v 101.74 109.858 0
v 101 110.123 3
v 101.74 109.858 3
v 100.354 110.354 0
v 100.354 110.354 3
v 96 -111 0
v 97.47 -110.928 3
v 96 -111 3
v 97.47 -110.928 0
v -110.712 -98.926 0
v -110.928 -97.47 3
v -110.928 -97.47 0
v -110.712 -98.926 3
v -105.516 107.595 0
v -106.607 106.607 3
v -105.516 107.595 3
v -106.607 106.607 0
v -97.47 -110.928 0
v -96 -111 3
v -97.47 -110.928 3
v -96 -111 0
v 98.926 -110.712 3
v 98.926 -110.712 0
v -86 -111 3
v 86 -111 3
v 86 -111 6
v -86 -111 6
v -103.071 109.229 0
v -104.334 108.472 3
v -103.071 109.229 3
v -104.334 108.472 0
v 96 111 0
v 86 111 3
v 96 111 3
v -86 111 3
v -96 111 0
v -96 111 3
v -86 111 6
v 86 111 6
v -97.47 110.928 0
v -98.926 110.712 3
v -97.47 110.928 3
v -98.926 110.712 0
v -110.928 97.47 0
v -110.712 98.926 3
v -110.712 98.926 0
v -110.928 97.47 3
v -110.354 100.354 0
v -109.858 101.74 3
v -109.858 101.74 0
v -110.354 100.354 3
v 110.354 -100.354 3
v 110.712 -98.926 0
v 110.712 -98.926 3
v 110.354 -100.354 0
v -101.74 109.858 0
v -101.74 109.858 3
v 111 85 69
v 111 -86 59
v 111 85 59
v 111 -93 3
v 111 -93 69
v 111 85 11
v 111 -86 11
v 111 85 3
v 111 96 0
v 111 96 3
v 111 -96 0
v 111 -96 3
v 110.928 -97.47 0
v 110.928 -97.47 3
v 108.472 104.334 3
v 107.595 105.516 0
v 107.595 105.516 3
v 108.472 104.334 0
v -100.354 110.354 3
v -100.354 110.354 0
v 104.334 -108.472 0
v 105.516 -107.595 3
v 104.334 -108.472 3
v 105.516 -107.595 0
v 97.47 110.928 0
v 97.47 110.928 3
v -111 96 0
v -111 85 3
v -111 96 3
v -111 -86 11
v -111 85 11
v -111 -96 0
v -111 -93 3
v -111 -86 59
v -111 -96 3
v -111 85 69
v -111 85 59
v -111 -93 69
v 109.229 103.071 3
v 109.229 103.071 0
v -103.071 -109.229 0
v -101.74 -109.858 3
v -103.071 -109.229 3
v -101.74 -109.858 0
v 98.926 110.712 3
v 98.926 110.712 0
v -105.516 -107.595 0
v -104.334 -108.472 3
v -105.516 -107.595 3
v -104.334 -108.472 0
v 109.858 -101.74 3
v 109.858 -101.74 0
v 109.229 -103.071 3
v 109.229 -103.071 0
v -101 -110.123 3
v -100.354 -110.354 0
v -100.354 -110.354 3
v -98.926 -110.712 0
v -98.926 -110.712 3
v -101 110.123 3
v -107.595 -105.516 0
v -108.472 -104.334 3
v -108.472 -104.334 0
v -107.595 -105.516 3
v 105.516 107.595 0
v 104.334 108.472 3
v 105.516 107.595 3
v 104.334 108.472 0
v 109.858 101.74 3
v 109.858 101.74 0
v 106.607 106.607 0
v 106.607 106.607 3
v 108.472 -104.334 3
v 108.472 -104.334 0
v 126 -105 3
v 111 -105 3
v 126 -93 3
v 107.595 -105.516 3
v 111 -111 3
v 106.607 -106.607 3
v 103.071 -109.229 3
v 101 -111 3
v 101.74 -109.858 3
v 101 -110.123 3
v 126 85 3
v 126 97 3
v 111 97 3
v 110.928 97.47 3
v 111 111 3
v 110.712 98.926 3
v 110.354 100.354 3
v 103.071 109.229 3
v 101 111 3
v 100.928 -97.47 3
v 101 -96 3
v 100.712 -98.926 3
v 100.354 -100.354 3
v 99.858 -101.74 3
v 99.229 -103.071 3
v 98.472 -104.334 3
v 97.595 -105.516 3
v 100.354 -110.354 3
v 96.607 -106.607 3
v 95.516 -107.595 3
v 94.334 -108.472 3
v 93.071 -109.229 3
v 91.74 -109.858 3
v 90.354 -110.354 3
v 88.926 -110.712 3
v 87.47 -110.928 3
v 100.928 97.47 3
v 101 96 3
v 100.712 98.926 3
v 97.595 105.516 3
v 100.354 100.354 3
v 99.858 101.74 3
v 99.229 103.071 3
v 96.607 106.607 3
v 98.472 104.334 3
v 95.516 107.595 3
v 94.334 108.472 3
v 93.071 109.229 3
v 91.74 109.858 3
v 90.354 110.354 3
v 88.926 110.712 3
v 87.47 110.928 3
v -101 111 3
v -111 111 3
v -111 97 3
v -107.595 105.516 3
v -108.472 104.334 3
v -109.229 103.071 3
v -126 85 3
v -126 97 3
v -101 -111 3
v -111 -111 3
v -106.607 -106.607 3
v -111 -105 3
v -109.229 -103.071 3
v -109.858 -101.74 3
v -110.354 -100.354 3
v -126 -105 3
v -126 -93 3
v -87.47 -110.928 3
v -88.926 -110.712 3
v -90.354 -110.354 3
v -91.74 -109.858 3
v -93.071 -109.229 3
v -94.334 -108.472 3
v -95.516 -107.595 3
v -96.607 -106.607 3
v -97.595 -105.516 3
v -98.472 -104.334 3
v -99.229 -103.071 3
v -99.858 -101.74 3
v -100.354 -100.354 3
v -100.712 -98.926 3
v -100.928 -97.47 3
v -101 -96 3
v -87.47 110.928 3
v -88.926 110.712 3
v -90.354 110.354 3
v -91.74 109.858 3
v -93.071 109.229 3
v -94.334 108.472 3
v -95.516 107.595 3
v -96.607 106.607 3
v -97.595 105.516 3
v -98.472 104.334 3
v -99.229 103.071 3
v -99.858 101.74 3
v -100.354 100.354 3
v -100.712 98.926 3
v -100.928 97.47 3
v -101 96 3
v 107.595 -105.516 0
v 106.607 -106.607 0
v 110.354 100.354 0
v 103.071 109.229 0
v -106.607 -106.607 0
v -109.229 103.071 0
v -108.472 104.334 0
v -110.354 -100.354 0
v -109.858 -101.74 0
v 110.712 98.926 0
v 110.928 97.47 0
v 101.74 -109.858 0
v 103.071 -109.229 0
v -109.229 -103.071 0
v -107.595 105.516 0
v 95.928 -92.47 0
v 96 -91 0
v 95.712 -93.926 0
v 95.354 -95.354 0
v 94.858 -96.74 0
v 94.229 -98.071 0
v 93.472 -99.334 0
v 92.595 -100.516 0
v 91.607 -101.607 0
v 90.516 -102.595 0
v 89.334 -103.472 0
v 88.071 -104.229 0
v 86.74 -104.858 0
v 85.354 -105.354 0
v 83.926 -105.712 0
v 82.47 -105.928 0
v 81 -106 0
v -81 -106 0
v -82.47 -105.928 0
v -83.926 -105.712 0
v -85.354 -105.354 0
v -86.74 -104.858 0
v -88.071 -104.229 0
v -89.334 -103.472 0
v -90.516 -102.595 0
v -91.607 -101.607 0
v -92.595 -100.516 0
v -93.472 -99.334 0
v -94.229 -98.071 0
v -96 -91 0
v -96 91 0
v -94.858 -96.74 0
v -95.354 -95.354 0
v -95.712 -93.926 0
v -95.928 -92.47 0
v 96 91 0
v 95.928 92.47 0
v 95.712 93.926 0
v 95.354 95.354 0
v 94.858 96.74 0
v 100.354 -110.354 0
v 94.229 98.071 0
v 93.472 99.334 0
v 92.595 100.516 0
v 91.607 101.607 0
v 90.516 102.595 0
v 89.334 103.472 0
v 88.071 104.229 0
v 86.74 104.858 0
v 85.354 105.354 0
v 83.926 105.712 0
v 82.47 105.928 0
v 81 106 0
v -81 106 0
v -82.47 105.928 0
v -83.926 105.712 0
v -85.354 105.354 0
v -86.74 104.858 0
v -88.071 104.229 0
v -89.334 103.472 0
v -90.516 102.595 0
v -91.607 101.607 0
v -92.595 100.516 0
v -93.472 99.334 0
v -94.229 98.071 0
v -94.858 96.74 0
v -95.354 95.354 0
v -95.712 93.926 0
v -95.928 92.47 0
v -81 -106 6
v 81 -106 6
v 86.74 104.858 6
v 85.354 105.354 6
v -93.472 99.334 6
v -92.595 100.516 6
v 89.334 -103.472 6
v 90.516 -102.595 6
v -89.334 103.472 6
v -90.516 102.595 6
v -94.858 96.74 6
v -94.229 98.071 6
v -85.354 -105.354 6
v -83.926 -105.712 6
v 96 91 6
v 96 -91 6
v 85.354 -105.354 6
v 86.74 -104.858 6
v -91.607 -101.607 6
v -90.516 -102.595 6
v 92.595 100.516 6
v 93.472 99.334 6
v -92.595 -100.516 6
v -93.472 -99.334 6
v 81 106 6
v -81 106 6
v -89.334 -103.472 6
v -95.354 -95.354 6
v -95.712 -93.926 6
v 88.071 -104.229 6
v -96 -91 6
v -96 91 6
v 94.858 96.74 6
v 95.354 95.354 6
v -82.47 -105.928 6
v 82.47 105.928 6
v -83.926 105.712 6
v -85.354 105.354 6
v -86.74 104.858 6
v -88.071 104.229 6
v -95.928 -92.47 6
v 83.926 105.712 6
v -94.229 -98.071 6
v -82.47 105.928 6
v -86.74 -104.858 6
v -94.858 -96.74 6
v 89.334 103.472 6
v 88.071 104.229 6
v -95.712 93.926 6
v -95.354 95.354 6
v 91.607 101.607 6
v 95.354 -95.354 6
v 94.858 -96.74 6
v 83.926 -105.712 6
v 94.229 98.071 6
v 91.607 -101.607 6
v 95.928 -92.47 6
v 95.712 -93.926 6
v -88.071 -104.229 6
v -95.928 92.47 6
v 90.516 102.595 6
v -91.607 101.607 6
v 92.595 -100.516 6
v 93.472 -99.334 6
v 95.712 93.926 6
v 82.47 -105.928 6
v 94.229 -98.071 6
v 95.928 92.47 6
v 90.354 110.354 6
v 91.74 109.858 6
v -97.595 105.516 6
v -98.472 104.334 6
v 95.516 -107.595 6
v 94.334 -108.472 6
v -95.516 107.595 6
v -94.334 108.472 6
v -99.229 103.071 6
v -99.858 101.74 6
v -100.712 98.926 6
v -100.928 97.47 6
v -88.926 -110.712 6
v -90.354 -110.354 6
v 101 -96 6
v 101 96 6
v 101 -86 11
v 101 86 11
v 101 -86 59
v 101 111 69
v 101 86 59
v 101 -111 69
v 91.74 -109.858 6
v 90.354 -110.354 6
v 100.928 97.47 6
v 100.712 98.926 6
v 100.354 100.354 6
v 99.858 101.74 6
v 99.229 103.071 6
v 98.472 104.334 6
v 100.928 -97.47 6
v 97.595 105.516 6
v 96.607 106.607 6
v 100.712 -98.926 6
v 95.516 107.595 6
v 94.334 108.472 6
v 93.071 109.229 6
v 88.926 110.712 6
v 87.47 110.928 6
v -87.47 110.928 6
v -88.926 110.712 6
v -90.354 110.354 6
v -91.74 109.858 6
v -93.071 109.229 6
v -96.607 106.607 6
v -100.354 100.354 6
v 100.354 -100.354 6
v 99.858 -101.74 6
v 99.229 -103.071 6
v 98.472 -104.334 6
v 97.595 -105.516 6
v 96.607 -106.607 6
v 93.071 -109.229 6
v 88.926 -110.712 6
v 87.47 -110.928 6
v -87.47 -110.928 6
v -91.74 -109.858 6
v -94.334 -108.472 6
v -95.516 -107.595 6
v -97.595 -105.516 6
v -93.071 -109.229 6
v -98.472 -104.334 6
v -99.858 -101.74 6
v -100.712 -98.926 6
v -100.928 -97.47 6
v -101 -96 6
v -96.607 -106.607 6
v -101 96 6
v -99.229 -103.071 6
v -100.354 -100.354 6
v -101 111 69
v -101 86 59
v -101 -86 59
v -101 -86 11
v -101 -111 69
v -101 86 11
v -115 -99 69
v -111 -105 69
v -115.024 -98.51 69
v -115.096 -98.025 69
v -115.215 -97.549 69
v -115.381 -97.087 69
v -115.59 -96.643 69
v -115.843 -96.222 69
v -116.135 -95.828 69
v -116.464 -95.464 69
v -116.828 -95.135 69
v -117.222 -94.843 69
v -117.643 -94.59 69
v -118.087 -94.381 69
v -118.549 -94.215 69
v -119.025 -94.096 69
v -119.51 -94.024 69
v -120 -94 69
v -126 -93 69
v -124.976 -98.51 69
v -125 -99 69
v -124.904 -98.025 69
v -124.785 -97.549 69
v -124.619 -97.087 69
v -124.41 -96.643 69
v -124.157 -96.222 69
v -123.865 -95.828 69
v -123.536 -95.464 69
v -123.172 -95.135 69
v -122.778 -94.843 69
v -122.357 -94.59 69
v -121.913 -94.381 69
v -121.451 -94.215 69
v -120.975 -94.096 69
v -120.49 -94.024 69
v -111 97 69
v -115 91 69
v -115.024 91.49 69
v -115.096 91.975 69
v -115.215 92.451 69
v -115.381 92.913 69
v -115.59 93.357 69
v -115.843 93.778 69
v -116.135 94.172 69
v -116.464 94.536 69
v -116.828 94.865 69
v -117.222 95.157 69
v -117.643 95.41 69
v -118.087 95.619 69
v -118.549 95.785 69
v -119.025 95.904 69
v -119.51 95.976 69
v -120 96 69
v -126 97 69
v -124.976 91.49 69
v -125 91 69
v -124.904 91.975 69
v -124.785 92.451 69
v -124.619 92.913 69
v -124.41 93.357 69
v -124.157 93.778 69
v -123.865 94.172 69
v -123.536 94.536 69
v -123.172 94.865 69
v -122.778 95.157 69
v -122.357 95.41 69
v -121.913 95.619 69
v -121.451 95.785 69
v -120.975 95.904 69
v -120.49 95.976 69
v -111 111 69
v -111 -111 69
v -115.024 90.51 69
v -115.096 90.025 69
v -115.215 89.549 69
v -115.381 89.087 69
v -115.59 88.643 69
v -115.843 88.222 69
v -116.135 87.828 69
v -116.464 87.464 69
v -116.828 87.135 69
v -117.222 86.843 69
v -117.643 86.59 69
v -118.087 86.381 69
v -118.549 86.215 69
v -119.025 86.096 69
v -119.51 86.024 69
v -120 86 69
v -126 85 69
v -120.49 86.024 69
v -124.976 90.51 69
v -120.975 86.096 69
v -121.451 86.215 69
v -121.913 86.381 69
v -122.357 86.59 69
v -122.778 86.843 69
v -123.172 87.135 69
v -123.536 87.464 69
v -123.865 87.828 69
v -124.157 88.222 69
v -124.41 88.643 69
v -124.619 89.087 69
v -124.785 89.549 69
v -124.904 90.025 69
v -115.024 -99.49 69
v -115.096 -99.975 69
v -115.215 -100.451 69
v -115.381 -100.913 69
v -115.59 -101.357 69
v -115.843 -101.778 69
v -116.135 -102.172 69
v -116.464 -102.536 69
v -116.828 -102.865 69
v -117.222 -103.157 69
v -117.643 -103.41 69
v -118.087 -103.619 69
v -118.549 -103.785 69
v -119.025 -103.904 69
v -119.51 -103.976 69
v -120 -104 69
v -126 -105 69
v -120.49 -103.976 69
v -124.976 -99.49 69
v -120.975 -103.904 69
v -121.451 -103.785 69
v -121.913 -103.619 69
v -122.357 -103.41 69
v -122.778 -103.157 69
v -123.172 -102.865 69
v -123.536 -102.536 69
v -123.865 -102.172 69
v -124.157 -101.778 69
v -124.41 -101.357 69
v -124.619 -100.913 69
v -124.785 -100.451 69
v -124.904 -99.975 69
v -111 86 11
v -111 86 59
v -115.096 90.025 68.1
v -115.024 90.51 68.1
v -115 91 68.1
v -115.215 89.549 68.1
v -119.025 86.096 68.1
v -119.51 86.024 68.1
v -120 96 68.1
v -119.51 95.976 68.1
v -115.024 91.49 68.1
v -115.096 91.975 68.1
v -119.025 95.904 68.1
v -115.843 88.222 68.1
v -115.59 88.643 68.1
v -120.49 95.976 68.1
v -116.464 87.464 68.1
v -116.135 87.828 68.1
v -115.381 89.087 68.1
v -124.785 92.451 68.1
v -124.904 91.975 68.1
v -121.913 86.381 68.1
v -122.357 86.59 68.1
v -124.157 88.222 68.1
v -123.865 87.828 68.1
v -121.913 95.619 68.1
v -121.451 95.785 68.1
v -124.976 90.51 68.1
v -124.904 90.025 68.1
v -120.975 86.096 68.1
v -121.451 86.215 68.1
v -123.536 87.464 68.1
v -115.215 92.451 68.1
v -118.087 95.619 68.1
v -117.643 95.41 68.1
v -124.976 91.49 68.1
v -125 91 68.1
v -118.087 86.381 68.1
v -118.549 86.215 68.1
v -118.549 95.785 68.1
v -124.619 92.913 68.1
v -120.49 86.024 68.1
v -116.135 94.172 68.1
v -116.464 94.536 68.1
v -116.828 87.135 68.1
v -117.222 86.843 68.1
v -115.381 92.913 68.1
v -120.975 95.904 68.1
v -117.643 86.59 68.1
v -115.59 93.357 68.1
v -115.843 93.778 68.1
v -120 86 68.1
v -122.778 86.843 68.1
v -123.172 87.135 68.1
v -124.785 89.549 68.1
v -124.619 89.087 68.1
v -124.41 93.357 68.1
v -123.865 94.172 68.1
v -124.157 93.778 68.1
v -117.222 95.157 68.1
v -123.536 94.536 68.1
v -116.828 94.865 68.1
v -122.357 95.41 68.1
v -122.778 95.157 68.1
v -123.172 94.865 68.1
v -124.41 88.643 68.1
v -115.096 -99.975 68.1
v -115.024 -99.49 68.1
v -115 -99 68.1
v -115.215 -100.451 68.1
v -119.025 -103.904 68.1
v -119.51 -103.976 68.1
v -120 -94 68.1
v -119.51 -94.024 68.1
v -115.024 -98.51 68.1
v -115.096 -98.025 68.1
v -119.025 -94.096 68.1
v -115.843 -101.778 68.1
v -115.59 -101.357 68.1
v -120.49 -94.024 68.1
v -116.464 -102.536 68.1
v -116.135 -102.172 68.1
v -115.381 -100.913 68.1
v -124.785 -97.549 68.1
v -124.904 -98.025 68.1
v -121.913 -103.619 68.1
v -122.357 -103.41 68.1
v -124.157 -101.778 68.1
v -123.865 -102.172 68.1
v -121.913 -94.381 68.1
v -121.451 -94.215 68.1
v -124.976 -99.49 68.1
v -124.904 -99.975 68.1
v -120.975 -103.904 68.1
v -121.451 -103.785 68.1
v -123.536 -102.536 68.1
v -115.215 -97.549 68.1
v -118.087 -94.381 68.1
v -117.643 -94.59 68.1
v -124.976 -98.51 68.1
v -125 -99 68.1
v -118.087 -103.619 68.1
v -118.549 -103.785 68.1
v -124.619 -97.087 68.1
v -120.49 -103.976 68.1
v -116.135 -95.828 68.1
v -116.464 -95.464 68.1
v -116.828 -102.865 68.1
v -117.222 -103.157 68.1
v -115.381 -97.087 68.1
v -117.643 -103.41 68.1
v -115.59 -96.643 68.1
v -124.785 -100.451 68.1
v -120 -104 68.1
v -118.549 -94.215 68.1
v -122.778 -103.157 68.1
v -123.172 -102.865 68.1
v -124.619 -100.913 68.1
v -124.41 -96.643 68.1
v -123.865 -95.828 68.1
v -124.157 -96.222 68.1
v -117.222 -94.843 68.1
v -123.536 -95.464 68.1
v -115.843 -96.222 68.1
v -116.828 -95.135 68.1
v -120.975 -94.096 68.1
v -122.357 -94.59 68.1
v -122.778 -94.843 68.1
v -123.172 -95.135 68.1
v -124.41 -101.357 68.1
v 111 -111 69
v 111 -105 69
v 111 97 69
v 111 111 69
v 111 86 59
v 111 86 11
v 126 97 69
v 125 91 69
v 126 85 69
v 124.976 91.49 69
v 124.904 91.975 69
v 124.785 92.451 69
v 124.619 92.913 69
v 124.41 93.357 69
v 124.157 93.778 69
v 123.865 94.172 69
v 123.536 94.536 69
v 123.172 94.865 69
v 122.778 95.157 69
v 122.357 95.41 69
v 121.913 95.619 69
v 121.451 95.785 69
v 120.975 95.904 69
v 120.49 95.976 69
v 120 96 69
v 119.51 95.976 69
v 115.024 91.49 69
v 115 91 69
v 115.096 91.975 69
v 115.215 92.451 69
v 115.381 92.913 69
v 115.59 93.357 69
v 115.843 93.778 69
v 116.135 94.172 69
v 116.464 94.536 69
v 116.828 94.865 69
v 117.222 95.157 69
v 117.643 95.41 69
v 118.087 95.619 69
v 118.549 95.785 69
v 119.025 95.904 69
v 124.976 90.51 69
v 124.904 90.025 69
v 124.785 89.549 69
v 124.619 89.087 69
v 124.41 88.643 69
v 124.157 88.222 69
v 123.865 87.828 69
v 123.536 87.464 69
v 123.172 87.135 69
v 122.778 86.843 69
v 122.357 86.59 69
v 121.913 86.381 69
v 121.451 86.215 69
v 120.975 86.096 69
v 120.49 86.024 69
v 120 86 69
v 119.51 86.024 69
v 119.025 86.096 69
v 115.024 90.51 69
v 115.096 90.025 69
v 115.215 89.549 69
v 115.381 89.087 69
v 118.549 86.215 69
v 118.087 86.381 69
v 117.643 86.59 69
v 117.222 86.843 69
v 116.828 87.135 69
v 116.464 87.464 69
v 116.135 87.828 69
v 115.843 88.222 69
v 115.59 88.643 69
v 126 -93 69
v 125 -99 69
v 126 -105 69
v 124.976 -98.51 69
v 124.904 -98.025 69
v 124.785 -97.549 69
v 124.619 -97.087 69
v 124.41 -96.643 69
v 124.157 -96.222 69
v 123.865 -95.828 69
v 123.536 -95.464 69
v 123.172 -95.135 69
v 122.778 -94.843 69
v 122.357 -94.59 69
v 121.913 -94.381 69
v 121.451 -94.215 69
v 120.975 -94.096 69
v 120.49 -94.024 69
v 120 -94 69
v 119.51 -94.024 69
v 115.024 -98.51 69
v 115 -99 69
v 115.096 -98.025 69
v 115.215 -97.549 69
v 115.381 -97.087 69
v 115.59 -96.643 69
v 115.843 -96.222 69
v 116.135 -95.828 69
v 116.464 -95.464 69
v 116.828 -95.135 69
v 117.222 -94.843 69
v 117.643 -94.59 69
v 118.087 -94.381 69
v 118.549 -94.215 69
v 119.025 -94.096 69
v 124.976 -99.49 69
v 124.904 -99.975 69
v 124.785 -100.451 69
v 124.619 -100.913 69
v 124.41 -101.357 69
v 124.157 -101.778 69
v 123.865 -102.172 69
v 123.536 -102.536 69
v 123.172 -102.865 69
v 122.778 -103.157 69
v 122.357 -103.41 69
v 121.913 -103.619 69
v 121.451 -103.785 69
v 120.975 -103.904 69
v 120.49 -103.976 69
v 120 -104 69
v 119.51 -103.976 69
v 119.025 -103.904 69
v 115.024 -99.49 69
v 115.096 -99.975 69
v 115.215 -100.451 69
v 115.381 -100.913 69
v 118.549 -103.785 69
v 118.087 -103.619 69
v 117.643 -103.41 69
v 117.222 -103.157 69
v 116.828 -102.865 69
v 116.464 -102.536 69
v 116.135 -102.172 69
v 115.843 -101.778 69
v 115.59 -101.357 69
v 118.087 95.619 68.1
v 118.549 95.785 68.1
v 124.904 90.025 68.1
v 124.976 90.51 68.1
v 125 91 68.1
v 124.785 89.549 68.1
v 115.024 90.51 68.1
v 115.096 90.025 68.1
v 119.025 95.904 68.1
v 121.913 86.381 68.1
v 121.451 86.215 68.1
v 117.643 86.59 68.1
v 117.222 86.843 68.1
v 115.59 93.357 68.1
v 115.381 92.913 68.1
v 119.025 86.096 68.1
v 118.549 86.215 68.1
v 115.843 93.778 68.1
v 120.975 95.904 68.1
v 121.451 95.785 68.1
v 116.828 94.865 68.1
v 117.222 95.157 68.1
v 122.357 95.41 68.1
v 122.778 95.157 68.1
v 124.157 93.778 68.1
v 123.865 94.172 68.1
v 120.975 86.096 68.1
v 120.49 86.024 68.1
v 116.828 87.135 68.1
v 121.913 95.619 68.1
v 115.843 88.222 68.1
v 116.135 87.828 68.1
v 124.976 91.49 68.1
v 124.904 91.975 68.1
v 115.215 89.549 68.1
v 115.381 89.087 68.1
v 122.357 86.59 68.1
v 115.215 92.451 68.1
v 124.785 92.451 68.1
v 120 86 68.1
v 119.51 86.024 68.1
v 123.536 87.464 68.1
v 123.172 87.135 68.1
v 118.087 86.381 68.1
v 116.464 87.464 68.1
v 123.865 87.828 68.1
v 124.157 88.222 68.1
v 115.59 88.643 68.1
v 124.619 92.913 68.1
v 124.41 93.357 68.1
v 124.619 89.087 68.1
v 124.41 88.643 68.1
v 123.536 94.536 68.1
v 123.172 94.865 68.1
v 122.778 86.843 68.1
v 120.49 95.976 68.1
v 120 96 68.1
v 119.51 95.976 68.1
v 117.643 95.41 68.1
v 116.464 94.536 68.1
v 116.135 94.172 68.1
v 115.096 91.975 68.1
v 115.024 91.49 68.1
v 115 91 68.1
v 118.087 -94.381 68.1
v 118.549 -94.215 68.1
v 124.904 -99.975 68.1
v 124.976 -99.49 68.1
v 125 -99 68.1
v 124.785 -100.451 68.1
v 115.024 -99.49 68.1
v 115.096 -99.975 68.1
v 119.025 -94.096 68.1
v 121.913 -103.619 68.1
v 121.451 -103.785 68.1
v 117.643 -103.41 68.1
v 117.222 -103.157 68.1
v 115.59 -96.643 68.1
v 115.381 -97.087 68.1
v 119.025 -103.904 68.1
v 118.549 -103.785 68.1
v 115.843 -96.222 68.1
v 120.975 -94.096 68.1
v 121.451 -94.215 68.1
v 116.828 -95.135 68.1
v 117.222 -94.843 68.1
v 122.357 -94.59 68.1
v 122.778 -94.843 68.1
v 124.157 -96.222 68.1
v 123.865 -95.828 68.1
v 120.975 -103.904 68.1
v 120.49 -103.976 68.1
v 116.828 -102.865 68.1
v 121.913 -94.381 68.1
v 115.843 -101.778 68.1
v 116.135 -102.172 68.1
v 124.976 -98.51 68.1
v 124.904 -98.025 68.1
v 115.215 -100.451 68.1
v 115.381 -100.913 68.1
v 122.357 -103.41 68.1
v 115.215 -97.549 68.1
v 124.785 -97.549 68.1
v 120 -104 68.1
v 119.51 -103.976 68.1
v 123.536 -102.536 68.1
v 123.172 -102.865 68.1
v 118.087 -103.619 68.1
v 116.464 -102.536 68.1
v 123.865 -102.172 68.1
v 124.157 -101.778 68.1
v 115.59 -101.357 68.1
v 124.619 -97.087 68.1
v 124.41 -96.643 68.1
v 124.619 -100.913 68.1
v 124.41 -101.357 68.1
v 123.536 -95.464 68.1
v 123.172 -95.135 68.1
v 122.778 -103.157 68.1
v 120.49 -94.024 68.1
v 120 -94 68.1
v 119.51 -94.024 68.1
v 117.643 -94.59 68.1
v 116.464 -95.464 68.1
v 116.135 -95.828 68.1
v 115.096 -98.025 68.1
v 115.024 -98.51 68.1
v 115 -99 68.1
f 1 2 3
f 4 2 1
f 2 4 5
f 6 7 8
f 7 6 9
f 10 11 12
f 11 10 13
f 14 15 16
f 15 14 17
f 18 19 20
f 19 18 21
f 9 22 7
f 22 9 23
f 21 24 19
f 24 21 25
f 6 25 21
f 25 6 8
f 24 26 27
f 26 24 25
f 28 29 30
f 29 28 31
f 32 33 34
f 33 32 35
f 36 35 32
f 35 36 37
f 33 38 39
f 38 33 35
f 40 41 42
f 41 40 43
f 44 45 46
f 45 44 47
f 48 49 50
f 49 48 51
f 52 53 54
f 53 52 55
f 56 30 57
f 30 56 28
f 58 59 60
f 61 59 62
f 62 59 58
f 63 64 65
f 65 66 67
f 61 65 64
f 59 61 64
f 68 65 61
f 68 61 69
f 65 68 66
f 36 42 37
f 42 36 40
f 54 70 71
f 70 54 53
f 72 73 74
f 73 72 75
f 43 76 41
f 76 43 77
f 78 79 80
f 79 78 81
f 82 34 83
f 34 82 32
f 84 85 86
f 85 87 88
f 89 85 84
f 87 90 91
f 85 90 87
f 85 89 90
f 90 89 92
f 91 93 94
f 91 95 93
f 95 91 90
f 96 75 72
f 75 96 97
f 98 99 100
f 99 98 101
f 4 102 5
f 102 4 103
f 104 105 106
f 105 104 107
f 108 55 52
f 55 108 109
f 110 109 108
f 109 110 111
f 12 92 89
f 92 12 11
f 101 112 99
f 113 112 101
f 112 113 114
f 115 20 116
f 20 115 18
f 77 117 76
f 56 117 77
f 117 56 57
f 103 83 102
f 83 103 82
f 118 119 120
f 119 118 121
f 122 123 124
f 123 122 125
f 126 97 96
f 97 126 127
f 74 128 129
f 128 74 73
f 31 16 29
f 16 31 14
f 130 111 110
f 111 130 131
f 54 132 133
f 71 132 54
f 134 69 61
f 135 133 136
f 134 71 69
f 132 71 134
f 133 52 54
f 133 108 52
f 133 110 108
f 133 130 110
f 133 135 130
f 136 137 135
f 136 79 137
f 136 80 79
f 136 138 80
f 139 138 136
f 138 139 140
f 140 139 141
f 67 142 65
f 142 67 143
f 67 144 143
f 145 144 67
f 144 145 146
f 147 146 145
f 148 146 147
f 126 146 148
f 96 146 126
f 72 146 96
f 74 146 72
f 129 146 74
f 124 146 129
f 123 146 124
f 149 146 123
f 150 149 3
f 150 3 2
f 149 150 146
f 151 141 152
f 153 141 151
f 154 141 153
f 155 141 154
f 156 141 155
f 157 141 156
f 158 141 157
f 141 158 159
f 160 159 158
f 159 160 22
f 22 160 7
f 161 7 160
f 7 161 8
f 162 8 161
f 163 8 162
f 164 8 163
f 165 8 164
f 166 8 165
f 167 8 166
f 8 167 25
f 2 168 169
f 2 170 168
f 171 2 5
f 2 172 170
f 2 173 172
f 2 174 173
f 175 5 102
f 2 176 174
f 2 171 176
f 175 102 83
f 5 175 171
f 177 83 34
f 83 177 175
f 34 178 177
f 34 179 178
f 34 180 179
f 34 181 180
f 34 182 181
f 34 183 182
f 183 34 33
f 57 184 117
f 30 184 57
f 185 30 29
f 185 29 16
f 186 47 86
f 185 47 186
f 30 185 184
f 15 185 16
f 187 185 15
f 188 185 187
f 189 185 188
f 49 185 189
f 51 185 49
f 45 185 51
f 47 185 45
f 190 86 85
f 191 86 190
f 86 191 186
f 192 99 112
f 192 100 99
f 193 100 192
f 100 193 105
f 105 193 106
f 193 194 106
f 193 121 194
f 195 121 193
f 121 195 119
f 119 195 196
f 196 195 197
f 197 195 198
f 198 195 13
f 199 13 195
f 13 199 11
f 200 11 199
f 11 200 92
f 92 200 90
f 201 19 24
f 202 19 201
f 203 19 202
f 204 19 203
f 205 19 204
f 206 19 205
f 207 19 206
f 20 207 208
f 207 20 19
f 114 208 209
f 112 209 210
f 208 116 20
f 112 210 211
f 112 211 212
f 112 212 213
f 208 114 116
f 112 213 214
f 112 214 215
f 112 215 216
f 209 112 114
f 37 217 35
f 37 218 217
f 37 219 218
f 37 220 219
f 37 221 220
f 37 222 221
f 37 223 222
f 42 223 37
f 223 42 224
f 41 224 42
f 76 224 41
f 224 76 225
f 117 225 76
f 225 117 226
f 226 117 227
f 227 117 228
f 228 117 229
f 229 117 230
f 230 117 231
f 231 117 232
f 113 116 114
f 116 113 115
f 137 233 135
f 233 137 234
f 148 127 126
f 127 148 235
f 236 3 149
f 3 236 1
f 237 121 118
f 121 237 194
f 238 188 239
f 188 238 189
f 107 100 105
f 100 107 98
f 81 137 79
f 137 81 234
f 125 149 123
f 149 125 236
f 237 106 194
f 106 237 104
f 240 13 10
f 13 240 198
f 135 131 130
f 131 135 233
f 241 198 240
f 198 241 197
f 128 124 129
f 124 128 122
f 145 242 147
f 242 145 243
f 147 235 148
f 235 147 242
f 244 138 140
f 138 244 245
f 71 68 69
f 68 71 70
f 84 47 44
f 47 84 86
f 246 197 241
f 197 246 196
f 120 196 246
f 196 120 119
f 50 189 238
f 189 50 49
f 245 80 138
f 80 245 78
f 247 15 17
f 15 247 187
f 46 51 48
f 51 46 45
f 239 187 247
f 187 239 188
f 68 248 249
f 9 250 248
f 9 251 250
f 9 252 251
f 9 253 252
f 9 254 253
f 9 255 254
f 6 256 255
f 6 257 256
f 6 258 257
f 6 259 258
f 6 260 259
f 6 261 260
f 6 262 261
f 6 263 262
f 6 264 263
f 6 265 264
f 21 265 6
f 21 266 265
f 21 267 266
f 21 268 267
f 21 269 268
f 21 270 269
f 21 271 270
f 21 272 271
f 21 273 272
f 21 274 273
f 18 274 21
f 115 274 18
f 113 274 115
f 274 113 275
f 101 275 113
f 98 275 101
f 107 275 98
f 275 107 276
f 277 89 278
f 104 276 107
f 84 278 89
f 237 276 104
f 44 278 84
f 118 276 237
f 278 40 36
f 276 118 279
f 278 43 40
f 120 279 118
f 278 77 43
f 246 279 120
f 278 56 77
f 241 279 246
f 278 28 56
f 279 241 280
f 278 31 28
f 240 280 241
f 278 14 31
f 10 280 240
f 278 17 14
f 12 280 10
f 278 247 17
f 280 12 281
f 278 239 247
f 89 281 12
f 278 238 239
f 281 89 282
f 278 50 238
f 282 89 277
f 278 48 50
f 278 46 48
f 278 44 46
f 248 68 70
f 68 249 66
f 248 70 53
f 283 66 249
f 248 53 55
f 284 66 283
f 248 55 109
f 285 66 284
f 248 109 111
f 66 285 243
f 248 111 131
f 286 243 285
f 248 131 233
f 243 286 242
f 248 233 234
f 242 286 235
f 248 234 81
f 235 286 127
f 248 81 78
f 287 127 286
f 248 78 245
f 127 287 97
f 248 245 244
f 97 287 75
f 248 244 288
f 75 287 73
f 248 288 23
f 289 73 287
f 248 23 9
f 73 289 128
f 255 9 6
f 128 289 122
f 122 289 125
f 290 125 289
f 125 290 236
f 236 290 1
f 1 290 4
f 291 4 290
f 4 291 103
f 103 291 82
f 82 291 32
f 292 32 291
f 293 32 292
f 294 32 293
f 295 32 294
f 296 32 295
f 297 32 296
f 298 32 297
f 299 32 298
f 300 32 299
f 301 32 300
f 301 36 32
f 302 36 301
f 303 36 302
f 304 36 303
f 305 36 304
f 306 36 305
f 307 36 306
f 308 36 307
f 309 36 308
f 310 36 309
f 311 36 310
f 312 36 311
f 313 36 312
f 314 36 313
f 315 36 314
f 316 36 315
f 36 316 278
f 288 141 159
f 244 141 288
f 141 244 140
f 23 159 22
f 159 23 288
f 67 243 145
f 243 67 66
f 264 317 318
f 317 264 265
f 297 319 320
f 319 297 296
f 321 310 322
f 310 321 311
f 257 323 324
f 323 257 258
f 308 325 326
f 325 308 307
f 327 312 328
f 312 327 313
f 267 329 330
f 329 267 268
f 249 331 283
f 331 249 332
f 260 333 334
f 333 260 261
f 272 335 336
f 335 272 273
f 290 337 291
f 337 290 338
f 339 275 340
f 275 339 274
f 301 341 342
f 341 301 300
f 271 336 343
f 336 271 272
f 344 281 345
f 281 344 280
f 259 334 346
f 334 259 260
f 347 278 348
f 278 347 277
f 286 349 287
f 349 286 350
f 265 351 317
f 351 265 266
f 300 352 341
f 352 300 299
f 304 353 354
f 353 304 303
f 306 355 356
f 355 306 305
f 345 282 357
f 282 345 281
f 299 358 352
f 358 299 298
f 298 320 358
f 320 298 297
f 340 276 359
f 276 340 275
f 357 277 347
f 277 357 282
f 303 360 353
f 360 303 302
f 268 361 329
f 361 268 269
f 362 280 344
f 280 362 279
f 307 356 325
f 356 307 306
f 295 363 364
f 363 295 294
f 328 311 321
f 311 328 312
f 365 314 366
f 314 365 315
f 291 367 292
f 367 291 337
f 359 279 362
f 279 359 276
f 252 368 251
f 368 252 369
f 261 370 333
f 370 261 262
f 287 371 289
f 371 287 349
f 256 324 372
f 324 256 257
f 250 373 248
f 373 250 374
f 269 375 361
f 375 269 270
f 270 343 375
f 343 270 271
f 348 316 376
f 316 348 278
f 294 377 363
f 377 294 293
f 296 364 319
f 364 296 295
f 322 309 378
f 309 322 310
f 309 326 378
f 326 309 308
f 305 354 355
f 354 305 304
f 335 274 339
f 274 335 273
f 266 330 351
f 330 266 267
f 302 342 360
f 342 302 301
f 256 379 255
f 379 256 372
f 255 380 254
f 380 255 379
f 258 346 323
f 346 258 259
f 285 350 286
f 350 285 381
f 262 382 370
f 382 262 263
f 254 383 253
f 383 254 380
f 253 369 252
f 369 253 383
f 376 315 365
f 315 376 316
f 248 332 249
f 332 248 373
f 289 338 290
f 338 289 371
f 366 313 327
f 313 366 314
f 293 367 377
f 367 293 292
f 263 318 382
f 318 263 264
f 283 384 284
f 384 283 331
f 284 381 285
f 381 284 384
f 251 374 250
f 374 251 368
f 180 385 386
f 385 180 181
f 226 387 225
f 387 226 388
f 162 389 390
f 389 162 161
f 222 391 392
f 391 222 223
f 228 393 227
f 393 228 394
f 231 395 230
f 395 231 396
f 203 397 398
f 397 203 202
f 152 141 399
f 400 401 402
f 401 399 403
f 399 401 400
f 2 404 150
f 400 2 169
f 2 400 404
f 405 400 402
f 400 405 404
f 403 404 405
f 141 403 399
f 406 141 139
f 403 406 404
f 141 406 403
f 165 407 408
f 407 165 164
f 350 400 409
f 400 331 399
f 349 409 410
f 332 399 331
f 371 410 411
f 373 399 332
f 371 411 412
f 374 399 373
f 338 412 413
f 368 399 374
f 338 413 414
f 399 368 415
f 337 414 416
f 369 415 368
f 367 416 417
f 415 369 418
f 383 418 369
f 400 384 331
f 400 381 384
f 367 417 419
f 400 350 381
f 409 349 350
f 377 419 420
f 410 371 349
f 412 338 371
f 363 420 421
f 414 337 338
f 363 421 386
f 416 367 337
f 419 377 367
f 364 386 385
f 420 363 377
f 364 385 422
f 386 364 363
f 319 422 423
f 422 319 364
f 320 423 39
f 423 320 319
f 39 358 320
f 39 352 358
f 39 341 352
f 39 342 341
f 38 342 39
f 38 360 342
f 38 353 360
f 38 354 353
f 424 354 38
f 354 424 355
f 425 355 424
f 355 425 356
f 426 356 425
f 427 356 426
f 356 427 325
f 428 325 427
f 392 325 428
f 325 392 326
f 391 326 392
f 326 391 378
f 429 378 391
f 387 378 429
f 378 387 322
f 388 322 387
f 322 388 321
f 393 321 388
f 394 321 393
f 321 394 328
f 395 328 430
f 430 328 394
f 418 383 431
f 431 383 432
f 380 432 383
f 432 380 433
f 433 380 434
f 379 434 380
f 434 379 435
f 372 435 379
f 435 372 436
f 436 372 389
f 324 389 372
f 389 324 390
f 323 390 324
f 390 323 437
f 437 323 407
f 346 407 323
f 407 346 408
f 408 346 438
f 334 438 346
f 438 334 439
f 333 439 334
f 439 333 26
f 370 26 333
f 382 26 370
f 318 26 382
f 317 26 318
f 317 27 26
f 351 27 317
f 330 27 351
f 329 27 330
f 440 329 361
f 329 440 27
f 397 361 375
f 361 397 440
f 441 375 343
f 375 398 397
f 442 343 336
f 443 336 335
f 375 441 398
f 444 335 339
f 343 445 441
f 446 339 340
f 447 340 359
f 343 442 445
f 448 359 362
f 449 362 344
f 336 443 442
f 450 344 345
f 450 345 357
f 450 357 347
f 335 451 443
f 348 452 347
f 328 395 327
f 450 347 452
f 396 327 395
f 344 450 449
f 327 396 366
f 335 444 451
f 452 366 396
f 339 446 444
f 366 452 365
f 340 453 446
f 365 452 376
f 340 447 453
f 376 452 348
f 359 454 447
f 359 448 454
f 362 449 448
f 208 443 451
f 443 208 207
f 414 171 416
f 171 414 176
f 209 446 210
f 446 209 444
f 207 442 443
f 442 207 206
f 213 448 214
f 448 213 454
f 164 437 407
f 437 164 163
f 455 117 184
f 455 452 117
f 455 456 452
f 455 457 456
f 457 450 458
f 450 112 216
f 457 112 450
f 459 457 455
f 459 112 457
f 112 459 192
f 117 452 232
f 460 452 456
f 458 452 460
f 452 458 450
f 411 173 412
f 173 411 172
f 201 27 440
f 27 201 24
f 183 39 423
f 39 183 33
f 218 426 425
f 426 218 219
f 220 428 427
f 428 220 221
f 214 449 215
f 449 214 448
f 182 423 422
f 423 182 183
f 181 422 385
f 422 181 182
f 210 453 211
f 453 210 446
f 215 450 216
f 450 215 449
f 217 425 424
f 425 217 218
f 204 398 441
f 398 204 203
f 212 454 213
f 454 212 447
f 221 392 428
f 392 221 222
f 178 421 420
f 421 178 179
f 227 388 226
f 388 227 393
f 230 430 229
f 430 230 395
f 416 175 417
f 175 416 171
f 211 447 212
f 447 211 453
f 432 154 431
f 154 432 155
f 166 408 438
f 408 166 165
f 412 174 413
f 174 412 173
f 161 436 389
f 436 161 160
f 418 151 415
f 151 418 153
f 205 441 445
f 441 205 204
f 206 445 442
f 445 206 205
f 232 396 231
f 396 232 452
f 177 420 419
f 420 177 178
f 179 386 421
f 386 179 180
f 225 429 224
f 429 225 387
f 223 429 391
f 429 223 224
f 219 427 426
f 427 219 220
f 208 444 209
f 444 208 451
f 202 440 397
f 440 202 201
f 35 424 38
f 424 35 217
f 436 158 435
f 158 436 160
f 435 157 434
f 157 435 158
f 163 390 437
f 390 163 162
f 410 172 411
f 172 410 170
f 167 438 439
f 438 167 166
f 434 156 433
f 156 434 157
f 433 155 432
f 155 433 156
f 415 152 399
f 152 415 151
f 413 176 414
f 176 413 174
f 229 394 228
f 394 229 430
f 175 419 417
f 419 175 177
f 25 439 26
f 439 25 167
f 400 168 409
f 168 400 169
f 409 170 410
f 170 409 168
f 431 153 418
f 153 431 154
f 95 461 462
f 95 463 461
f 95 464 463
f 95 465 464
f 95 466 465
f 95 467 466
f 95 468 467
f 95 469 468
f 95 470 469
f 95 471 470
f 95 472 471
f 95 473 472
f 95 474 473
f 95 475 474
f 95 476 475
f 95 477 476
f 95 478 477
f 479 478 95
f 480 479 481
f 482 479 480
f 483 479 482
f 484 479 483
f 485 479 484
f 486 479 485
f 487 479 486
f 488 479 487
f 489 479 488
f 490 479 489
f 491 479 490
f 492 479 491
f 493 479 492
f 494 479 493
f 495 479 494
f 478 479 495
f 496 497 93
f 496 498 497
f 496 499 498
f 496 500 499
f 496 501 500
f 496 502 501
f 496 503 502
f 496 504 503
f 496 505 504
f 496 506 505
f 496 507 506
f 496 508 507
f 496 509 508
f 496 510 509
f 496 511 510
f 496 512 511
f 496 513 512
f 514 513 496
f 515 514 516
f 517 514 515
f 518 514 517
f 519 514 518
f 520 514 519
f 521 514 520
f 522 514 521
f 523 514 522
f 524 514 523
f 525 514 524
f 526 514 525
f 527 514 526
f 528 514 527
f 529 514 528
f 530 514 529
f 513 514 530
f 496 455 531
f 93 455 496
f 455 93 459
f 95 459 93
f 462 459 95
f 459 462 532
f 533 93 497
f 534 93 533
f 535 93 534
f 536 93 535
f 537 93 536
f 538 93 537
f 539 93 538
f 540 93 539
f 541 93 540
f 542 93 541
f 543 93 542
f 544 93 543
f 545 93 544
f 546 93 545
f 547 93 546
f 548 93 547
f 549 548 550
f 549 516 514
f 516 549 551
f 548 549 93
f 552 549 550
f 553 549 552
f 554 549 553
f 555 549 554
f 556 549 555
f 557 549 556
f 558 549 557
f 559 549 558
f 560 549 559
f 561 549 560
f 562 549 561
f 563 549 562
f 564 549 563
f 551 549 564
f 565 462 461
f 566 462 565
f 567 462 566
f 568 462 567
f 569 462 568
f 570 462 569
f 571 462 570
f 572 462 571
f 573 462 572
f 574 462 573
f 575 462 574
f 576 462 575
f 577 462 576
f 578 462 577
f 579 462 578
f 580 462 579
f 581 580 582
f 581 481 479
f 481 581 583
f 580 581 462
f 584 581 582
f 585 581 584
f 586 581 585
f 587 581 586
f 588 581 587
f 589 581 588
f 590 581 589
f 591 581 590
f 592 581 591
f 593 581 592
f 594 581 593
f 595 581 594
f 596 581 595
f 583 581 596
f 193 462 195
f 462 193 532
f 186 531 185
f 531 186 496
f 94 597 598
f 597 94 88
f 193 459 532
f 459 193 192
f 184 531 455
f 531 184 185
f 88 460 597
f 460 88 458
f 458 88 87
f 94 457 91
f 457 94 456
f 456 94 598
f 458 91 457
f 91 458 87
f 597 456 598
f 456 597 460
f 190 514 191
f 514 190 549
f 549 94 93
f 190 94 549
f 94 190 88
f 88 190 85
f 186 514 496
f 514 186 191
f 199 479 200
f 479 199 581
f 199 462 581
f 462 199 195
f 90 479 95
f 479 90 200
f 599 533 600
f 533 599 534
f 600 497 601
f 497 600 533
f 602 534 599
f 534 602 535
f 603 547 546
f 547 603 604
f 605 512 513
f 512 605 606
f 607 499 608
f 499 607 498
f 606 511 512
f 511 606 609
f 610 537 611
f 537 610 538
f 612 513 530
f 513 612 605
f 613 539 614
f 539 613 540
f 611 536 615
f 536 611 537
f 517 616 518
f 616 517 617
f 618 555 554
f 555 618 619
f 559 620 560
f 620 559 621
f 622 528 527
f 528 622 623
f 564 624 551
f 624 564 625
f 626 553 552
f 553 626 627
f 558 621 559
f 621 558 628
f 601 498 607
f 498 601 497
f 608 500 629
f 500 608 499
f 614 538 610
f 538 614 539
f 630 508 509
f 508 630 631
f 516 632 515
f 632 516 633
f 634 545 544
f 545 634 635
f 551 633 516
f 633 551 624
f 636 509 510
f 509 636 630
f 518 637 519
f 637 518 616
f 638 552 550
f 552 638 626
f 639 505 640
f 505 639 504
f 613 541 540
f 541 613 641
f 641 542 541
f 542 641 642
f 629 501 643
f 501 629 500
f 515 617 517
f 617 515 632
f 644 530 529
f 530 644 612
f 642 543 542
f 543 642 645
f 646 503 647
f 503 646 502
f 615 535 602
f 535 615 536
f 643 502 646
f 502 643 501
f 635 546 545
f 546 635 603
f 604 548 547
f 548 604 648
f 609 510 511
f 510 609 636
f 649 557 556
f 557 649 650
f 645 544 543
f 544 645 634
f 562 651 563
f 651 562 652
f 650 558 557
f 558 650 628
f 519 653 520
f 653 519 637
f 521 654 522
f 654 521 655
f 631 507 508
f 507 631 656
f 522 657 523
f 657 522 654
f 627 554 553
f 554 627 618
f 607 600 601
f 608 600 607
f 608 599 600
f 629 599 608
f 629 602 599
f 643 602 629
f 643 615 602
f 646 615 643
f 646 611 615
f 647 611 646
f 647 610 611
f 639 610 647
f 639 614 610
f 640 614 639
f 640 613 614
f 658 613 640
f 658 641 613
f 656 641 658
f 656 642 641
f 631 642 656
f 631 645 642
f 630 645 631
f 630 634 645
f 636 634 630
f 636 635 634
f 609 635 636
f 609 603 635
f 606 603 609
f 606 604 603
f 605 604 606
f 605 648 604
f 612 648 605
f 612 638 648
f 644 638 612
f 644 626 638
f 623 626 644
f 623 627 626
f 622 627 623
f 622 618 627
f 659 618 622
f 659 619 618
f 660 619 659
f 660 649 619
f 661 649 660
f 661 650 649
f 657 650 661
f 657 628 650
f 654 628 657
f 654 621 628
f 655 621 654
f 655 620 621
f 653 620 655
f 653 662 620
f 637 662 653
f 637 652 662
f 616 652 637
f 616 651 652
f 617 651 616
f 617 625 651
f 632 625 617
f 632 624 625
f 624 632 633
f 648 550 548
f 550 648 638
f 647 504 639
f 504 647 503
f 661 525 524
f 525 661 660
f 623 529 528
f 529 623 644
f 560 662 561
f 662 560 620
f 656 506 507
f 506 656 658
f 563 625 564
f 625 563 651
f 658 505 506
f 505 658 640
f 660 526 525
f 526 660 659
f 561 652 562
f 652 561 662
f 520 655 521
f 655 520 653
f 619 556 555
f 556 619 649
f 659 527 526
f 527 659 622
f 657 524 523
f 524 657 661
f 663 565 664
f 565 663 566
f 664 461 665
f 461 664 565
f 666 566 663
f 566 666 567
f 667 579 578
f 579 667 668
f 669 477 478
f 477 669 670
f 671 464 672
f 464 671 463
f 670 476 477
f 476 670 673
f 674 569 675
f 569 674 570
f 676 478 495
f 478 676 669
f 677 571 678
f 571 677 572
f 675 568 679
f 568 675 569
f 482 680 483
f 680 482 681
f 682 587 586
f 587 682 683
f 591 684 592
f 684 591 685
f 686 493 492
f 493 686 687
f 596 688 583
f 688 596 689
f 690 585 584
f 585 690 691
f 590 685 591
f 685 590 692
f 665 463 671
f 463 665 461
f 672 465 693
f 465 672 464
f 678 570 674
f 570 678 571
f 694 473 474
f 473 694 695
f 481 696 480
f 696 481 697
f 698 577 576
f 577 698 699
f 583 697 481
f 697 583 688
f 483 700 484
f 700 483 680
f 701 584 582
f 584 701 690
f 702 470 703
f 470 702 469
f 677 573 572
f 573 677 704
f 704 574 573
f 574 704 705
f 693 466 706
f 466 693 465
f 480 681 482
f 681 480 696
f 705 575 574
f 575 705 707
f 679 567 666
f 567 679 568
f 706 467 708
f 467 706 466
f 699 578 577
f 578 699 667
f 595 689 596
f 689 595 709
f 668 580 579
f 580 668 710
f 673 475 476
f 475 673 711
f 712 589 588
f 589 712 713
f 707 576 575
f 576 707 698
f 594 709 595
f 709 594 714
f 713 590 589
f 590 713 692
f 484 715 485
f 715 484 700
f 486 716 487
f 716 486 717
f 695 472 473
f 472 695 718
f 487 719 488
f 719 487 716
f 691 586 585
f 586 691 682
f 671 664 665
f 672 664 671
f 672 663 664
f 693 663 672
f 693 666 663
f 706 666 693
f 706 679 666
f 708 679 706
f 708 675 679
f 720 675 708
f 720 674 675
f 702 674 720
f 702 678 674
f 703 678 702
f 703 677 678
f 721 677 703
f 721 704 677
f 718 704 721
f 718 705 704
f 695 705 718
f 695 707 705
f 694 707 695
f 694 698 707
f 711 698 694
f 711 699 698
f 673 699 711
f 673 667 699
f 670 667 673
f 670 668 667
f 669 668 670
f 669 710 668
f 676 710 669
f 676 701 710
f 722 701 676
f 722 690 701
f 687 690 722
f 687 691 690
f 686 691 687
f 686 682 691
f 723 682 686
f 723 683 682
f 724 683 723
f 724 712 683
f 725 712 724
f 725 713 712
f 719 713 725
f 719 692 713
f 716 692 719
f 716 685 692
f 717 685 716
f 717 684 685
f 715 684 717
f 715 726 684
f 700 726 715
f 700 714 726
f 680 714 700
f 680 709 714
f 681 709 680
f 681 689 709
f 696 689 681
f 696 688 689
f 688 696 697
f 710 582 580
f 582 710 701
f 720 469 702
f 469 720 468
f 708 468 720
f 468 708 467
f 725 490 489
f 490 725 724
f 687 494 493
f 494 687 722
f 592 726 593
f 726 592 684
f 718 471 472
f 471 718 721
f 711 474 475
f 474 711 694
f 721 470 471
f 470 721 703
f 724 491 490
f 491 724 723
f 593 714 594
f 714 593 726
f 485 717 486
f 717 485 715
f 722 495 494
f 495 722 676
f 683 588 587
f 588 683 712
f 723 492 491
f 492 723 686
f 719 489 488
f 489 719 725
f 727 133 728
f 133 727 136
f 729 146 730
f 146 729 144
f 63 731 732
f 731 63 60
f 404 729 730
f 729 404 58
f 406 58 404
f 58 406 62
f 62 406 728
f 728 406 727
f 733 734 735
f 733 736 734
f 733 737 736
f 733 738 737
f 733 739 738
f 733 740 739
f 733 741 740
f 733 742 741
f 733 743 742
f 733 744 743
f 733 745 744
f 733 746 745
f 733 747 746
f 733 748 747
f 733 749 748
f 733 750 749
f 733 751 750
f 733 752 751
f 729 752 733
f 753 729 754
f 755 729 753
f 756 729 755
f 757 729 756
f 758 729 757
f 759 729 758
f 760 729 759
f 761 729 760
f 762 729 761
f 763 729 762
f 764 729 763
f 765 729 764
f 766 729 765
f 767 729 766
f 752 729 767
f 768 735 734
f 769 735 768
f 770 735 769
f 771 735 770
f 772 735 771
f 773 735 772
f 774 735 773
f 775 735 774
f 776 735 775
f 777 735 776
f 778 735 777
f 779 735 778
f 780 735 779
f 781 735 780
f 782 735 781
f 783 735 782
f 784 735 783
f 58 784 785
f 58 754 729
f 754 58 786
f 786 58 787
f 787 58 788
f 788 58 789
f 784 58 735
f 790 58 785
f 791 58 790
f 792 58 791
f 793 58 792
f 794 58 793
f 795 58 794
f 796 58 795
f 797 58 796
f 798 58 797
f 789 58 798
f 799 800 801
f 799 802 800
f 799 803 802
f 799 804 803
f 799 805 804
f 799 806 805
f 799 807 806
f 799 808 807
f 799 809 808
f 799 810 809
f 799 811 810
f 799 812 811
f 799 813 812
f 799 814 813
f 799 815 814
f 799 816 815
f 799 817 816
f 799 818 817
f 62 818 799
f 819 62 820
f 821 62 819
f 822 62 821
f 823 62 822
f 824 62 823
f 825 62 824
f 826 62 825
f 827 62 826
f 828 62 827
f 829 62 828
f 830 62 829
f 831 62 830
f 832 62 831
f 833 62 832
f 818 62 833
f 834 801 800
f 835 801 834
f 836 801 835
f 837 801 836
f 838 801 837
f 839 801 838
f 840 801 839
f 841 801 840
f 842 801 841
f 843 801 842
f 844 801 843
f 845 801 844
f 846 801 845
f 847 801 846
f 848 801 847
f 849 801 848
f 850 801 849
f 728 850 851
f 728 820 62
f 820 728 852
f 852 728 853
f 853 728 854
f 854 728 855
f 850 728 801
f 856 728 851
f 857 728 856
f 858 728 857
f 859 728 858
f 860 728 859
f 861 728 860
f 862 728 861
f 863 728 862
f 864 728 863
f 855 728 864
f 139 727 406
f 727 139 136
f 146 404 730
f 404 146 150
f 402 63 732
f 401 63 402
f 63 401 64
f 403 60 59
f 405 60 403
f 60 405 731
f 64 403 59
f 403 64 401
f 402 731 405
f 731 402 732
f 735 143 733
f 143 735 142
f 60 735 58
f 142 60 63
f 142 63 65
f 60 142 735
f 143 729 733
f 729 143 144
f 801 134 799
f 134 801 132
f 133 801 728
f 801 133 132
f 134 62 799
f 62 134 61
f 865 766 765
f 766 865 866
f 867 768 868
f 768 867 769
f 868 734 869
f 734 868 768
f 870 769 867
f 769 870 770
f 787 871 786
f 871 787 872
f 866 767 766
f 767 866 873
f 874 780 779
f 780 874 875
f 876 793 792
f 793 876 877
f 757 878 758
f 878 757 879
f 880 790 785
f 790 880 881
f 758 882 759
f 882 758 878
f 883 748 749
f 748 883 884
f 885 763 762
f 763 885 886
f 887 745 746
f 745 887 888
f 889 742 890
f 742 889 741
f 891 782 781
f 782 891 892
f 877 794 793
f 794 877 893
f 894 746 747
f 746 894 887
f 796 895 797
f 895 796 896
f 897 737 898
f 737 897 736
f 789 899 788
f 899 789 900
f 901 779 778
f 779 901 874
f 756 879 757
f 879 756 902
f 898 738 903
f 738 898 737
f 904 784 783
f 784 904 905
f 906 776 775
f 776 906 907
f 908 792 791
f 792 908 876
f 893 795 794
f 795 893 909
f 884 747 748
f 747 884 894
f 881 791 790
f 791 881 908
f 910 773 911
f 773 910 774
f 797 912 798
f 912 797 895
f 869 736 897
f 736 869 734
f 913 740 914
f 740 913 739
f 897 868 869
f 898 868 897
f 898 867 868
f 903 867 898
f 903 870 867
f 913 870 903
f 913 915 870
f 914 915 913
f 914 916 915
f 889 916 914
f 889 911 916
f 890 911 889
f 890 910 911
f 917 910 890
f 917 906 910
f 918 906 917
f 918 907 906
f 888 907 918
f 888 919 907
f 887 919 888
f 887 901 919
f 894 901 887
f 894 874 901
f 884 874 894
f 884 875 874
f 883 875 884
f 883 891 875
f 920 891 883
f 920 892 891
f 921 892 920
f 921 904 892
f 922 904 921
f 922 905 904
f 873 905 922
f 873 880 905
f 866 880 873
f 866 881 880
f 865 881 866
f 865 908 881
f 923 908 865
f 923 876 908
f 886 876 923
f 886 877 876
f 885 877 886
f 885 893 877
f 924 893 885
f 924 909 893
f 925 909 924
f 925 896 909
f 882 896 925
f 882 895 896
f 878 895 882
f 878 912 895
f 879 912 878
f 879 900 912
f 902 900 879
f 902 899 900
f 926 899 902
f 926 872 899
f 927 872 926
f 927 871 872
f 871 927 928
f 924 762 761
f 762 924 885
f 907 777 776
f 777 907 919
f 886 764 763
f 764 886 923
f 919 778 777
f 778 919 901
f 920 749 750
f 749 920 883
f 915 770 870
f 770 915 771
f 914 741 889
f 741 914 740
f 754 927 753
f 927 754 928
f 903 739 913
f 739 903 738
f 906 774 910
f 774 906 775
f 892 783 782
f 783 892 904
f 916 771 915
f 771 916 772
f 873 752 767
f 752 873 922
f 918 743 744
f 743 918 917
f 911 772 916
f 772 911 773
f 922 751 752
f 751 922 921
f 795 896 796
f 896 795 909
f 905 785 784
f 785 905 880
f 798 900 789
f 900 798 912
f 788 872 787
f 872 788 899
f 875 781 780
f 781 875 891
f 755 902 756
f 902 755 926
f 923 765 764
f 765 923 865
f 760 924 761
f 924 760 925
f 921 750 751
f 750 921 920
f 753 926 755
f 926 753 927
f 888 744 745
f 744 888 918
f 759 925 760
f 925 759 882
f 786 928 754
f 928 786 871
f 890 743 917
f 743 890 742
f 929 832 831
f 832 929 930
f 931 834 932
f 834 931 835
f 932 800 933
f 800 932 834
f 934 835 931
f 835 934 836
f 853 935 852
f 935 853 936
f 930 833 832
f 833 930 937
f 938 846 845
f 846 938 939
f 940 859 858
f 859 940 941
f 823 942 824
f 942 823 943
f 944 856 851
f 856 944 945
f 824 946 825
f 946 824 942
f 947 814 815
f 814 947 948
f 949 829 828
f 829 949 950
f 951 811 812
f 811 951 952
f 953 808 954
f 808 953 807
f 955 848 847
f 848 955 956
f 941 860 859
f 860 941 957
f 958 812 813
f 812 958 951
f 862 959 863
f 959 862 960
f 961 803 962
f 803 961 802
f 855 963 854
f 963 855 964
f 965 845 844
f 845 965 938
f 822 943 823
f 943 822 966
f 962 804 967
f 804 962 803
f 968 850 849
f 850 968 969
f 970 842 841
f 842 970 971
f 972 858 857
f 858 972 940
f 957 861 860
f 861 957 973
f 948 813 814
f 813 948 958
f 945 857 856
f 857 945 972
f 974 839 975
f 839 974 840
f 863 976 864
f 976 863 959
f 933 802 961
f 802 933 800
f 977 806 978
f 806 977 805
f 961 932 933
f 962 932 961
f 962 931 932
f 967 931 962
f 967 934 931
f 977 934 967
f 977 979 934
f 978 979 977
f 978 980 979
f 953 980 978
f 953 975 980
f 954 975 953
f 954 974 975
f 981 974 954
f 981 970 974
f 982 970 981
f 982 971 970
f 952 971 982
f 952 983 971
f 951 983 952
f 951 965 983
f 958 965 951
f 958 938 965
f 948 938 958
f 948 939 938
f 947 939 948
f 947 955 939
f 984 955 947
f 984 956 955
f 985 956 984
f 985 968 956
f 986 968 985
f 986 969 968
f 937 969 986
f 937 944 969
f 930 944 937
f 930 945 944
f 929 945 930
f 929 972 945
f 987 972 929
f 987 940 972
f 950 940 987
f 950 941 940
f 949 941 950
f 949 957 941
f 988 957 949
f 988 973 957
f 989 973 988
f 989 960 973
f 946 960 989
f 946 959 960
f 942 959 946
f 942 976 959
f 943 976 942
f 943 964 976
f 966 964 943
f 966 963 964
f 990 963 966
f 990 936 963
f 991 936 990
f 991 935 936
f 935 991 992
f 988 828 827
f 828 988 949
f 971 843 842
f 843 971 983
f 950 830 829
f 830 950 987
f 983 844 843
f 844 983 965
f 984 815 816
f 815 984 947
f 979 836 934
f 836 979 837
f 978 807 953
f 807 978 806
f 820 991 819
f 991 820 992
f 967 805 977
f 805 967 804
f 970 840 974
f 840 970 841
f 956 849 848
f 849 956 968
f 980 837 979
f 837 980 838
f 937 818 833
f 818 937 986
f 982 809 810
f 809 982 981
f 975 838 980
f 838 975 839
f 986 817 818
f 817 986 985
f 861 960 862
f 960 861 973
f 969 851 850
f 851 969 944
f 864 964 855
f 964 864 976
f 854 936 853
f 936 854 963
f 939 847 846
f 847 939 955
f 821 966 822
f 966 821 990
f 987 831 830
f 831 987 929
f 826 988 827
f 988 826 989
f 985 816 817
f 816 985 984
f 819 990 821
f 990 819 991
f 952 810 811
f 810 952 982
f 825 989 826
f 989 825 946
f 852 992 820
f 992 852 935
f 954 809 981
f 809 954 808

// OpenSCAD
// WiiM Amp Retention Bracket for 1U Vented Rack Shelf
//
// A top-down retention bracket that secures a WiiM Amp to a vented rack shelf.
// Side walls connect via a top plate with ventilation cutout.
// Front and back are completely open for port and cable access.
// Bracket attaches using M4/M5 screws from below the shelf, threading into
// heat-set inserts embedded in the bracket's insert bosses.
//
// PRINT ORIENTATION: Print upside-down (top plate on build plate) for best results.
// Rotate 180° around X axis in your slicer before printing.
// No supports needed. Use 3+ perimeters for insert boss strength.

/* [Device Dimensions] */
// Width of the WiiM Amp
device_width = 190; // [100:1:300]
// Depth of the WiiM Amp
device_depth = 190; // [100:1:300]
// Height of the WiiM Amp
device_height = 63; // [20:1:100]

/* [Bracket Dimensions] */
// Overall bracket width (device + clearance + 2×lip_overhang + 2×wall_thickness)
bracket_width = 222; // [150:1:350]
// Overall bracket depth
bracket_depth = 222; // [150:1:350]
// Top plate thickness
top_plate_thickness = 3; // [2:0.5:5]
// Side wall height (lip bottom at device height: 63 + lip_thickness 3 = 66)
side_wall_height = 66; // [30:1:100]
// Side wall thickness (same as frame border for strength)
wall_thickness = 10; // [5:1:20]

/* [Ventilation Cutout] */
// Width of center ventilation cutout
cutout_width = 170; // [100:1:250]
// Depth of center ventilation cutout
cutout_depth = 190; // [100:1:250]

/* [Retention Lip] */
// How far the lip extends inward over the device
lip_overhang = 5; // [3:1:15]
// Thickness of the lip (hangs down from top plate)
lip_thickness = 3; // [2:1:6]
// Corner radius for squircle shape
corner_radius = 15; // [5:1:30]

/* [Threaded Insert Bosses] */
// Insert size: M4 or M5
insert_size = "M4"; // [M4, M5]
// Boss outer diameter
boss_diameter = 12; // [10:1:20]
// Boss height (extends below wall bottom)
boss_height = 10; // [8:1:15]
// M4 insert hole diameter (typical for heat-set inserts)
m4_hole_diameter = 5.6; // [5.0:0.1:6.0]
// M5 insert hole diameter (typical for heat-set inserts)
m5_hole_diameter = 6.4; // [6.0:0.1:7.0]
// Insert hole depth
insert_hole_depth = 8; // [6:1:12]
// Front insert distance from front edge (center of boss)
front_insert_offset = 20; // [10:1:40]
// Back insert distance from back edge (center of boss)
back_insert_offset = 12; // [10:1:40]
// Boss overhang from wall OUTWARD (for slot alignment: 9mm gives 240mm = 12 × 20mm spacing)
boss_overhang = 9; // [0:0.5:15]

/* [Rendering] */
$fa = 1;
$fn = 64;

// Calculate insert hole diameter based on selected size
insert_hole_diameter = (insert_size == "M5") ? m5_hole_diameter : m4_hole_diameter;

// 2D rounded rectangle (squircle)
module rounded_rect(width, depth, radius) {
    offset(r = radius)
    offset(r = -radius)
        square([width, depth], center = true);
}

// Top plate with rounded cutout and integrated retention lip
module top_plate() {
    // Inner dimensions (device cavity)
    inner_width = bracket_width - 2 * wall_thickness;
    inner_depth = bracket_depth;  // Open front/back

    difference() {
        // Outer plate with rounded corners
        translate([bracket_width/2, bracket_depth/2, 0])
            linear_extrude(height = top_plate_thickness)
            rounded_rect(bracket_width, bracket_depth, corner_radius);

        // Center ventilation cutout (smaller than inner, leaves lip)
        translate([bracket_width/2, bracket_depth/2, -0.5])
            linear_extrude(height = top_plate_thickness + 1)
            rounded_rect(inner_width - 2*lip_overhang, inner_depth - 2*lip_overhang, corner_radius);
    }

    // Retention lip hanging down from top plate
    translate([0, 0, -lip_thickness])
    difference() {
        // Outer boundary of lip (same as inner edge of top plate frame)
        translate([bracket_width/2, bracket_depth/2, 0])
            linear_extrude(height = lip_thickness)
            rounded_rect(inner_width, inner_depth, corner_radius);

        // Inner cutout (device clearance)
        translate([bracket_width/2, bracket_depth/2, -0.5])
            linear_extrude(height = lip_thickness + 1)
            rounded_rect(inner_width - 2*lip_overhang, inner_depth - 2*lip_overhang, corner_radius);
    }
}

// Threaded insert boss with hole for heat-set insert
// Boss sits flush with wall bottom at Z=0, extends upward
module insert_boss() {
    difference() {
        // Cylindrical boss - from shelf level (Z=0) up into wall structure
        cylinder(d = boss_diameter, h = boss_height);

        // Insert hole (from bottom at Z=0, for screw from below shelf)
        translate([0, 0, -0.5])
            cylinder(d = insert_hole_diameter, h = insert_hole_depth + 0.5);
    }
}

// Counterbore cut - applied after boss and flange are combined
module counterbore_cut() {
    counterbore_depth = 1; // Subtle step to indicate insert location
    counterbore_diameter = boss_diameter - 2; // 10mm step around 5.6mm hole
    cylinder(d = counterbore_diameter, h = counterbore_depth);
}

// Flange to support insert boss extending OUTWARD (away from device)
// Boss rests on shelf surface, screw from below creates clamping force
// Flange extends full wall height to connect boss to wall structure
module boss_flange(y_pos, is_left) {
    flange_width = boss_overhang + boss_diameter / 2; // Extends to support boss center

    // Flange extends from wall OUTWARD (away from device)
    // Full height from Z=0 (shelf) to wall_frame_bottom (where solid wall starts)
    // Left wall: flange goes left (negative X)
    // Right wall: flange goes right (positive X from wall outer edge)
    translate([is_left ? -flange_width : wall_thickness,
               y_pos - boss_diameter / 2,
               0])
        cube([flange_width, boss_diameter, side_wall_height]);
}

// Side wall with insert bosses on OUTWARD flanges at front and back corners
// Bosses extend outward (over shelf vent area), everything sits flush on shelf at Z=0
module side_wall(is_left) {
    // X position for boss center (overhangs OUTWARD away from device)
    // Left wall: boss is to the left of wall (-overhang)
    // Right wall: boss is to the right of wall (wall_thickness + overhang)
    boss_x = is_left ? (-boss_overhang) : (wall_thickness + boss_overhang);

    // Wall hollowing parameters
    wall_frame_width = 25; // Solid material at front and back of wall
    wall_frame_top = 8; // Solid material at top of wall (connects to top plate)
    wall_frame_bottom = 10; // Solid material at bottom (structural + boss support)

    // Apply counterbore cuts AFTER combining boss and flange geometry
    difference() {
        union() {
            // Hollowed wall body - frame with cutout in middle
            difference() {
                cube([wall_thickness, bracket_depth, side_wall_height]);

                // Cutout in middle of wall (leave frame around edges)
                translate([-0.5,
                           wall_frame_width,
                           wall_frame_bottom])
                    cube([wall_thickness + 1,
                          bracket_depth - 2 * wall_frame_width,
                          side_wall_height - wall_frame_bottom - wall_frame_top]);
            }

            // Front flange and insert boss (extending OUTWARD, flush with wall bottom)
            boss_flange(front_insert_offset, is_left);
            translate([boss_x, front_insert_offset, 0])
                insert_boss();

            // Back flange and insert boss (extending OUTWARD, flush with wall bottom)
            boss_flange(bracket_depth - back_insert_offset, is_left);
            translate([boss_x, bracket_depth - back_insert_offset, 0])
                insert_boss();
        }

        // Counterbore cuts at boss locations (cut from combined geometry)
        translate([boss_x, front_insert_offset, -0.1])
            counterbore_cut();
        translate([boss_x, bracket_depth - back_insert_offset, -0.1])
            counterbore_cut();
    }
}

// Complete bracket assembly
module bracket() {
    // Top plate sits at top of side walls
    translate([0, 0, side_wall_height])
        top_plate();

    // Left side wall (at X = 0, bosses overhang to the left)
    translate([0, 0, 0])
        side_wall(is_left = true);

    // Right side wall (at X = bracket_width - wall_thickness, bosses overhang to the right)
    translate([bracket_width - wall_thickness, 0, 0])
        side_wall(is_left = false);

}

// Main model - in print orientation (top plate on build plate, bosses pointing up)
// Guard: skip rendering if included by another file (e.g., tests)
if (!is_undef(RENDER_BRACKET) ? RENDER_BRACKET : true) {
    // Rotate 180° around X to flip upside-down, center on XY plane for slicer
    translate([-bracket_width/2, bracket_depth/2, side_wall_height + top_plate_thickness])
        rotate([180, 0, 0])
            bracket();
}
